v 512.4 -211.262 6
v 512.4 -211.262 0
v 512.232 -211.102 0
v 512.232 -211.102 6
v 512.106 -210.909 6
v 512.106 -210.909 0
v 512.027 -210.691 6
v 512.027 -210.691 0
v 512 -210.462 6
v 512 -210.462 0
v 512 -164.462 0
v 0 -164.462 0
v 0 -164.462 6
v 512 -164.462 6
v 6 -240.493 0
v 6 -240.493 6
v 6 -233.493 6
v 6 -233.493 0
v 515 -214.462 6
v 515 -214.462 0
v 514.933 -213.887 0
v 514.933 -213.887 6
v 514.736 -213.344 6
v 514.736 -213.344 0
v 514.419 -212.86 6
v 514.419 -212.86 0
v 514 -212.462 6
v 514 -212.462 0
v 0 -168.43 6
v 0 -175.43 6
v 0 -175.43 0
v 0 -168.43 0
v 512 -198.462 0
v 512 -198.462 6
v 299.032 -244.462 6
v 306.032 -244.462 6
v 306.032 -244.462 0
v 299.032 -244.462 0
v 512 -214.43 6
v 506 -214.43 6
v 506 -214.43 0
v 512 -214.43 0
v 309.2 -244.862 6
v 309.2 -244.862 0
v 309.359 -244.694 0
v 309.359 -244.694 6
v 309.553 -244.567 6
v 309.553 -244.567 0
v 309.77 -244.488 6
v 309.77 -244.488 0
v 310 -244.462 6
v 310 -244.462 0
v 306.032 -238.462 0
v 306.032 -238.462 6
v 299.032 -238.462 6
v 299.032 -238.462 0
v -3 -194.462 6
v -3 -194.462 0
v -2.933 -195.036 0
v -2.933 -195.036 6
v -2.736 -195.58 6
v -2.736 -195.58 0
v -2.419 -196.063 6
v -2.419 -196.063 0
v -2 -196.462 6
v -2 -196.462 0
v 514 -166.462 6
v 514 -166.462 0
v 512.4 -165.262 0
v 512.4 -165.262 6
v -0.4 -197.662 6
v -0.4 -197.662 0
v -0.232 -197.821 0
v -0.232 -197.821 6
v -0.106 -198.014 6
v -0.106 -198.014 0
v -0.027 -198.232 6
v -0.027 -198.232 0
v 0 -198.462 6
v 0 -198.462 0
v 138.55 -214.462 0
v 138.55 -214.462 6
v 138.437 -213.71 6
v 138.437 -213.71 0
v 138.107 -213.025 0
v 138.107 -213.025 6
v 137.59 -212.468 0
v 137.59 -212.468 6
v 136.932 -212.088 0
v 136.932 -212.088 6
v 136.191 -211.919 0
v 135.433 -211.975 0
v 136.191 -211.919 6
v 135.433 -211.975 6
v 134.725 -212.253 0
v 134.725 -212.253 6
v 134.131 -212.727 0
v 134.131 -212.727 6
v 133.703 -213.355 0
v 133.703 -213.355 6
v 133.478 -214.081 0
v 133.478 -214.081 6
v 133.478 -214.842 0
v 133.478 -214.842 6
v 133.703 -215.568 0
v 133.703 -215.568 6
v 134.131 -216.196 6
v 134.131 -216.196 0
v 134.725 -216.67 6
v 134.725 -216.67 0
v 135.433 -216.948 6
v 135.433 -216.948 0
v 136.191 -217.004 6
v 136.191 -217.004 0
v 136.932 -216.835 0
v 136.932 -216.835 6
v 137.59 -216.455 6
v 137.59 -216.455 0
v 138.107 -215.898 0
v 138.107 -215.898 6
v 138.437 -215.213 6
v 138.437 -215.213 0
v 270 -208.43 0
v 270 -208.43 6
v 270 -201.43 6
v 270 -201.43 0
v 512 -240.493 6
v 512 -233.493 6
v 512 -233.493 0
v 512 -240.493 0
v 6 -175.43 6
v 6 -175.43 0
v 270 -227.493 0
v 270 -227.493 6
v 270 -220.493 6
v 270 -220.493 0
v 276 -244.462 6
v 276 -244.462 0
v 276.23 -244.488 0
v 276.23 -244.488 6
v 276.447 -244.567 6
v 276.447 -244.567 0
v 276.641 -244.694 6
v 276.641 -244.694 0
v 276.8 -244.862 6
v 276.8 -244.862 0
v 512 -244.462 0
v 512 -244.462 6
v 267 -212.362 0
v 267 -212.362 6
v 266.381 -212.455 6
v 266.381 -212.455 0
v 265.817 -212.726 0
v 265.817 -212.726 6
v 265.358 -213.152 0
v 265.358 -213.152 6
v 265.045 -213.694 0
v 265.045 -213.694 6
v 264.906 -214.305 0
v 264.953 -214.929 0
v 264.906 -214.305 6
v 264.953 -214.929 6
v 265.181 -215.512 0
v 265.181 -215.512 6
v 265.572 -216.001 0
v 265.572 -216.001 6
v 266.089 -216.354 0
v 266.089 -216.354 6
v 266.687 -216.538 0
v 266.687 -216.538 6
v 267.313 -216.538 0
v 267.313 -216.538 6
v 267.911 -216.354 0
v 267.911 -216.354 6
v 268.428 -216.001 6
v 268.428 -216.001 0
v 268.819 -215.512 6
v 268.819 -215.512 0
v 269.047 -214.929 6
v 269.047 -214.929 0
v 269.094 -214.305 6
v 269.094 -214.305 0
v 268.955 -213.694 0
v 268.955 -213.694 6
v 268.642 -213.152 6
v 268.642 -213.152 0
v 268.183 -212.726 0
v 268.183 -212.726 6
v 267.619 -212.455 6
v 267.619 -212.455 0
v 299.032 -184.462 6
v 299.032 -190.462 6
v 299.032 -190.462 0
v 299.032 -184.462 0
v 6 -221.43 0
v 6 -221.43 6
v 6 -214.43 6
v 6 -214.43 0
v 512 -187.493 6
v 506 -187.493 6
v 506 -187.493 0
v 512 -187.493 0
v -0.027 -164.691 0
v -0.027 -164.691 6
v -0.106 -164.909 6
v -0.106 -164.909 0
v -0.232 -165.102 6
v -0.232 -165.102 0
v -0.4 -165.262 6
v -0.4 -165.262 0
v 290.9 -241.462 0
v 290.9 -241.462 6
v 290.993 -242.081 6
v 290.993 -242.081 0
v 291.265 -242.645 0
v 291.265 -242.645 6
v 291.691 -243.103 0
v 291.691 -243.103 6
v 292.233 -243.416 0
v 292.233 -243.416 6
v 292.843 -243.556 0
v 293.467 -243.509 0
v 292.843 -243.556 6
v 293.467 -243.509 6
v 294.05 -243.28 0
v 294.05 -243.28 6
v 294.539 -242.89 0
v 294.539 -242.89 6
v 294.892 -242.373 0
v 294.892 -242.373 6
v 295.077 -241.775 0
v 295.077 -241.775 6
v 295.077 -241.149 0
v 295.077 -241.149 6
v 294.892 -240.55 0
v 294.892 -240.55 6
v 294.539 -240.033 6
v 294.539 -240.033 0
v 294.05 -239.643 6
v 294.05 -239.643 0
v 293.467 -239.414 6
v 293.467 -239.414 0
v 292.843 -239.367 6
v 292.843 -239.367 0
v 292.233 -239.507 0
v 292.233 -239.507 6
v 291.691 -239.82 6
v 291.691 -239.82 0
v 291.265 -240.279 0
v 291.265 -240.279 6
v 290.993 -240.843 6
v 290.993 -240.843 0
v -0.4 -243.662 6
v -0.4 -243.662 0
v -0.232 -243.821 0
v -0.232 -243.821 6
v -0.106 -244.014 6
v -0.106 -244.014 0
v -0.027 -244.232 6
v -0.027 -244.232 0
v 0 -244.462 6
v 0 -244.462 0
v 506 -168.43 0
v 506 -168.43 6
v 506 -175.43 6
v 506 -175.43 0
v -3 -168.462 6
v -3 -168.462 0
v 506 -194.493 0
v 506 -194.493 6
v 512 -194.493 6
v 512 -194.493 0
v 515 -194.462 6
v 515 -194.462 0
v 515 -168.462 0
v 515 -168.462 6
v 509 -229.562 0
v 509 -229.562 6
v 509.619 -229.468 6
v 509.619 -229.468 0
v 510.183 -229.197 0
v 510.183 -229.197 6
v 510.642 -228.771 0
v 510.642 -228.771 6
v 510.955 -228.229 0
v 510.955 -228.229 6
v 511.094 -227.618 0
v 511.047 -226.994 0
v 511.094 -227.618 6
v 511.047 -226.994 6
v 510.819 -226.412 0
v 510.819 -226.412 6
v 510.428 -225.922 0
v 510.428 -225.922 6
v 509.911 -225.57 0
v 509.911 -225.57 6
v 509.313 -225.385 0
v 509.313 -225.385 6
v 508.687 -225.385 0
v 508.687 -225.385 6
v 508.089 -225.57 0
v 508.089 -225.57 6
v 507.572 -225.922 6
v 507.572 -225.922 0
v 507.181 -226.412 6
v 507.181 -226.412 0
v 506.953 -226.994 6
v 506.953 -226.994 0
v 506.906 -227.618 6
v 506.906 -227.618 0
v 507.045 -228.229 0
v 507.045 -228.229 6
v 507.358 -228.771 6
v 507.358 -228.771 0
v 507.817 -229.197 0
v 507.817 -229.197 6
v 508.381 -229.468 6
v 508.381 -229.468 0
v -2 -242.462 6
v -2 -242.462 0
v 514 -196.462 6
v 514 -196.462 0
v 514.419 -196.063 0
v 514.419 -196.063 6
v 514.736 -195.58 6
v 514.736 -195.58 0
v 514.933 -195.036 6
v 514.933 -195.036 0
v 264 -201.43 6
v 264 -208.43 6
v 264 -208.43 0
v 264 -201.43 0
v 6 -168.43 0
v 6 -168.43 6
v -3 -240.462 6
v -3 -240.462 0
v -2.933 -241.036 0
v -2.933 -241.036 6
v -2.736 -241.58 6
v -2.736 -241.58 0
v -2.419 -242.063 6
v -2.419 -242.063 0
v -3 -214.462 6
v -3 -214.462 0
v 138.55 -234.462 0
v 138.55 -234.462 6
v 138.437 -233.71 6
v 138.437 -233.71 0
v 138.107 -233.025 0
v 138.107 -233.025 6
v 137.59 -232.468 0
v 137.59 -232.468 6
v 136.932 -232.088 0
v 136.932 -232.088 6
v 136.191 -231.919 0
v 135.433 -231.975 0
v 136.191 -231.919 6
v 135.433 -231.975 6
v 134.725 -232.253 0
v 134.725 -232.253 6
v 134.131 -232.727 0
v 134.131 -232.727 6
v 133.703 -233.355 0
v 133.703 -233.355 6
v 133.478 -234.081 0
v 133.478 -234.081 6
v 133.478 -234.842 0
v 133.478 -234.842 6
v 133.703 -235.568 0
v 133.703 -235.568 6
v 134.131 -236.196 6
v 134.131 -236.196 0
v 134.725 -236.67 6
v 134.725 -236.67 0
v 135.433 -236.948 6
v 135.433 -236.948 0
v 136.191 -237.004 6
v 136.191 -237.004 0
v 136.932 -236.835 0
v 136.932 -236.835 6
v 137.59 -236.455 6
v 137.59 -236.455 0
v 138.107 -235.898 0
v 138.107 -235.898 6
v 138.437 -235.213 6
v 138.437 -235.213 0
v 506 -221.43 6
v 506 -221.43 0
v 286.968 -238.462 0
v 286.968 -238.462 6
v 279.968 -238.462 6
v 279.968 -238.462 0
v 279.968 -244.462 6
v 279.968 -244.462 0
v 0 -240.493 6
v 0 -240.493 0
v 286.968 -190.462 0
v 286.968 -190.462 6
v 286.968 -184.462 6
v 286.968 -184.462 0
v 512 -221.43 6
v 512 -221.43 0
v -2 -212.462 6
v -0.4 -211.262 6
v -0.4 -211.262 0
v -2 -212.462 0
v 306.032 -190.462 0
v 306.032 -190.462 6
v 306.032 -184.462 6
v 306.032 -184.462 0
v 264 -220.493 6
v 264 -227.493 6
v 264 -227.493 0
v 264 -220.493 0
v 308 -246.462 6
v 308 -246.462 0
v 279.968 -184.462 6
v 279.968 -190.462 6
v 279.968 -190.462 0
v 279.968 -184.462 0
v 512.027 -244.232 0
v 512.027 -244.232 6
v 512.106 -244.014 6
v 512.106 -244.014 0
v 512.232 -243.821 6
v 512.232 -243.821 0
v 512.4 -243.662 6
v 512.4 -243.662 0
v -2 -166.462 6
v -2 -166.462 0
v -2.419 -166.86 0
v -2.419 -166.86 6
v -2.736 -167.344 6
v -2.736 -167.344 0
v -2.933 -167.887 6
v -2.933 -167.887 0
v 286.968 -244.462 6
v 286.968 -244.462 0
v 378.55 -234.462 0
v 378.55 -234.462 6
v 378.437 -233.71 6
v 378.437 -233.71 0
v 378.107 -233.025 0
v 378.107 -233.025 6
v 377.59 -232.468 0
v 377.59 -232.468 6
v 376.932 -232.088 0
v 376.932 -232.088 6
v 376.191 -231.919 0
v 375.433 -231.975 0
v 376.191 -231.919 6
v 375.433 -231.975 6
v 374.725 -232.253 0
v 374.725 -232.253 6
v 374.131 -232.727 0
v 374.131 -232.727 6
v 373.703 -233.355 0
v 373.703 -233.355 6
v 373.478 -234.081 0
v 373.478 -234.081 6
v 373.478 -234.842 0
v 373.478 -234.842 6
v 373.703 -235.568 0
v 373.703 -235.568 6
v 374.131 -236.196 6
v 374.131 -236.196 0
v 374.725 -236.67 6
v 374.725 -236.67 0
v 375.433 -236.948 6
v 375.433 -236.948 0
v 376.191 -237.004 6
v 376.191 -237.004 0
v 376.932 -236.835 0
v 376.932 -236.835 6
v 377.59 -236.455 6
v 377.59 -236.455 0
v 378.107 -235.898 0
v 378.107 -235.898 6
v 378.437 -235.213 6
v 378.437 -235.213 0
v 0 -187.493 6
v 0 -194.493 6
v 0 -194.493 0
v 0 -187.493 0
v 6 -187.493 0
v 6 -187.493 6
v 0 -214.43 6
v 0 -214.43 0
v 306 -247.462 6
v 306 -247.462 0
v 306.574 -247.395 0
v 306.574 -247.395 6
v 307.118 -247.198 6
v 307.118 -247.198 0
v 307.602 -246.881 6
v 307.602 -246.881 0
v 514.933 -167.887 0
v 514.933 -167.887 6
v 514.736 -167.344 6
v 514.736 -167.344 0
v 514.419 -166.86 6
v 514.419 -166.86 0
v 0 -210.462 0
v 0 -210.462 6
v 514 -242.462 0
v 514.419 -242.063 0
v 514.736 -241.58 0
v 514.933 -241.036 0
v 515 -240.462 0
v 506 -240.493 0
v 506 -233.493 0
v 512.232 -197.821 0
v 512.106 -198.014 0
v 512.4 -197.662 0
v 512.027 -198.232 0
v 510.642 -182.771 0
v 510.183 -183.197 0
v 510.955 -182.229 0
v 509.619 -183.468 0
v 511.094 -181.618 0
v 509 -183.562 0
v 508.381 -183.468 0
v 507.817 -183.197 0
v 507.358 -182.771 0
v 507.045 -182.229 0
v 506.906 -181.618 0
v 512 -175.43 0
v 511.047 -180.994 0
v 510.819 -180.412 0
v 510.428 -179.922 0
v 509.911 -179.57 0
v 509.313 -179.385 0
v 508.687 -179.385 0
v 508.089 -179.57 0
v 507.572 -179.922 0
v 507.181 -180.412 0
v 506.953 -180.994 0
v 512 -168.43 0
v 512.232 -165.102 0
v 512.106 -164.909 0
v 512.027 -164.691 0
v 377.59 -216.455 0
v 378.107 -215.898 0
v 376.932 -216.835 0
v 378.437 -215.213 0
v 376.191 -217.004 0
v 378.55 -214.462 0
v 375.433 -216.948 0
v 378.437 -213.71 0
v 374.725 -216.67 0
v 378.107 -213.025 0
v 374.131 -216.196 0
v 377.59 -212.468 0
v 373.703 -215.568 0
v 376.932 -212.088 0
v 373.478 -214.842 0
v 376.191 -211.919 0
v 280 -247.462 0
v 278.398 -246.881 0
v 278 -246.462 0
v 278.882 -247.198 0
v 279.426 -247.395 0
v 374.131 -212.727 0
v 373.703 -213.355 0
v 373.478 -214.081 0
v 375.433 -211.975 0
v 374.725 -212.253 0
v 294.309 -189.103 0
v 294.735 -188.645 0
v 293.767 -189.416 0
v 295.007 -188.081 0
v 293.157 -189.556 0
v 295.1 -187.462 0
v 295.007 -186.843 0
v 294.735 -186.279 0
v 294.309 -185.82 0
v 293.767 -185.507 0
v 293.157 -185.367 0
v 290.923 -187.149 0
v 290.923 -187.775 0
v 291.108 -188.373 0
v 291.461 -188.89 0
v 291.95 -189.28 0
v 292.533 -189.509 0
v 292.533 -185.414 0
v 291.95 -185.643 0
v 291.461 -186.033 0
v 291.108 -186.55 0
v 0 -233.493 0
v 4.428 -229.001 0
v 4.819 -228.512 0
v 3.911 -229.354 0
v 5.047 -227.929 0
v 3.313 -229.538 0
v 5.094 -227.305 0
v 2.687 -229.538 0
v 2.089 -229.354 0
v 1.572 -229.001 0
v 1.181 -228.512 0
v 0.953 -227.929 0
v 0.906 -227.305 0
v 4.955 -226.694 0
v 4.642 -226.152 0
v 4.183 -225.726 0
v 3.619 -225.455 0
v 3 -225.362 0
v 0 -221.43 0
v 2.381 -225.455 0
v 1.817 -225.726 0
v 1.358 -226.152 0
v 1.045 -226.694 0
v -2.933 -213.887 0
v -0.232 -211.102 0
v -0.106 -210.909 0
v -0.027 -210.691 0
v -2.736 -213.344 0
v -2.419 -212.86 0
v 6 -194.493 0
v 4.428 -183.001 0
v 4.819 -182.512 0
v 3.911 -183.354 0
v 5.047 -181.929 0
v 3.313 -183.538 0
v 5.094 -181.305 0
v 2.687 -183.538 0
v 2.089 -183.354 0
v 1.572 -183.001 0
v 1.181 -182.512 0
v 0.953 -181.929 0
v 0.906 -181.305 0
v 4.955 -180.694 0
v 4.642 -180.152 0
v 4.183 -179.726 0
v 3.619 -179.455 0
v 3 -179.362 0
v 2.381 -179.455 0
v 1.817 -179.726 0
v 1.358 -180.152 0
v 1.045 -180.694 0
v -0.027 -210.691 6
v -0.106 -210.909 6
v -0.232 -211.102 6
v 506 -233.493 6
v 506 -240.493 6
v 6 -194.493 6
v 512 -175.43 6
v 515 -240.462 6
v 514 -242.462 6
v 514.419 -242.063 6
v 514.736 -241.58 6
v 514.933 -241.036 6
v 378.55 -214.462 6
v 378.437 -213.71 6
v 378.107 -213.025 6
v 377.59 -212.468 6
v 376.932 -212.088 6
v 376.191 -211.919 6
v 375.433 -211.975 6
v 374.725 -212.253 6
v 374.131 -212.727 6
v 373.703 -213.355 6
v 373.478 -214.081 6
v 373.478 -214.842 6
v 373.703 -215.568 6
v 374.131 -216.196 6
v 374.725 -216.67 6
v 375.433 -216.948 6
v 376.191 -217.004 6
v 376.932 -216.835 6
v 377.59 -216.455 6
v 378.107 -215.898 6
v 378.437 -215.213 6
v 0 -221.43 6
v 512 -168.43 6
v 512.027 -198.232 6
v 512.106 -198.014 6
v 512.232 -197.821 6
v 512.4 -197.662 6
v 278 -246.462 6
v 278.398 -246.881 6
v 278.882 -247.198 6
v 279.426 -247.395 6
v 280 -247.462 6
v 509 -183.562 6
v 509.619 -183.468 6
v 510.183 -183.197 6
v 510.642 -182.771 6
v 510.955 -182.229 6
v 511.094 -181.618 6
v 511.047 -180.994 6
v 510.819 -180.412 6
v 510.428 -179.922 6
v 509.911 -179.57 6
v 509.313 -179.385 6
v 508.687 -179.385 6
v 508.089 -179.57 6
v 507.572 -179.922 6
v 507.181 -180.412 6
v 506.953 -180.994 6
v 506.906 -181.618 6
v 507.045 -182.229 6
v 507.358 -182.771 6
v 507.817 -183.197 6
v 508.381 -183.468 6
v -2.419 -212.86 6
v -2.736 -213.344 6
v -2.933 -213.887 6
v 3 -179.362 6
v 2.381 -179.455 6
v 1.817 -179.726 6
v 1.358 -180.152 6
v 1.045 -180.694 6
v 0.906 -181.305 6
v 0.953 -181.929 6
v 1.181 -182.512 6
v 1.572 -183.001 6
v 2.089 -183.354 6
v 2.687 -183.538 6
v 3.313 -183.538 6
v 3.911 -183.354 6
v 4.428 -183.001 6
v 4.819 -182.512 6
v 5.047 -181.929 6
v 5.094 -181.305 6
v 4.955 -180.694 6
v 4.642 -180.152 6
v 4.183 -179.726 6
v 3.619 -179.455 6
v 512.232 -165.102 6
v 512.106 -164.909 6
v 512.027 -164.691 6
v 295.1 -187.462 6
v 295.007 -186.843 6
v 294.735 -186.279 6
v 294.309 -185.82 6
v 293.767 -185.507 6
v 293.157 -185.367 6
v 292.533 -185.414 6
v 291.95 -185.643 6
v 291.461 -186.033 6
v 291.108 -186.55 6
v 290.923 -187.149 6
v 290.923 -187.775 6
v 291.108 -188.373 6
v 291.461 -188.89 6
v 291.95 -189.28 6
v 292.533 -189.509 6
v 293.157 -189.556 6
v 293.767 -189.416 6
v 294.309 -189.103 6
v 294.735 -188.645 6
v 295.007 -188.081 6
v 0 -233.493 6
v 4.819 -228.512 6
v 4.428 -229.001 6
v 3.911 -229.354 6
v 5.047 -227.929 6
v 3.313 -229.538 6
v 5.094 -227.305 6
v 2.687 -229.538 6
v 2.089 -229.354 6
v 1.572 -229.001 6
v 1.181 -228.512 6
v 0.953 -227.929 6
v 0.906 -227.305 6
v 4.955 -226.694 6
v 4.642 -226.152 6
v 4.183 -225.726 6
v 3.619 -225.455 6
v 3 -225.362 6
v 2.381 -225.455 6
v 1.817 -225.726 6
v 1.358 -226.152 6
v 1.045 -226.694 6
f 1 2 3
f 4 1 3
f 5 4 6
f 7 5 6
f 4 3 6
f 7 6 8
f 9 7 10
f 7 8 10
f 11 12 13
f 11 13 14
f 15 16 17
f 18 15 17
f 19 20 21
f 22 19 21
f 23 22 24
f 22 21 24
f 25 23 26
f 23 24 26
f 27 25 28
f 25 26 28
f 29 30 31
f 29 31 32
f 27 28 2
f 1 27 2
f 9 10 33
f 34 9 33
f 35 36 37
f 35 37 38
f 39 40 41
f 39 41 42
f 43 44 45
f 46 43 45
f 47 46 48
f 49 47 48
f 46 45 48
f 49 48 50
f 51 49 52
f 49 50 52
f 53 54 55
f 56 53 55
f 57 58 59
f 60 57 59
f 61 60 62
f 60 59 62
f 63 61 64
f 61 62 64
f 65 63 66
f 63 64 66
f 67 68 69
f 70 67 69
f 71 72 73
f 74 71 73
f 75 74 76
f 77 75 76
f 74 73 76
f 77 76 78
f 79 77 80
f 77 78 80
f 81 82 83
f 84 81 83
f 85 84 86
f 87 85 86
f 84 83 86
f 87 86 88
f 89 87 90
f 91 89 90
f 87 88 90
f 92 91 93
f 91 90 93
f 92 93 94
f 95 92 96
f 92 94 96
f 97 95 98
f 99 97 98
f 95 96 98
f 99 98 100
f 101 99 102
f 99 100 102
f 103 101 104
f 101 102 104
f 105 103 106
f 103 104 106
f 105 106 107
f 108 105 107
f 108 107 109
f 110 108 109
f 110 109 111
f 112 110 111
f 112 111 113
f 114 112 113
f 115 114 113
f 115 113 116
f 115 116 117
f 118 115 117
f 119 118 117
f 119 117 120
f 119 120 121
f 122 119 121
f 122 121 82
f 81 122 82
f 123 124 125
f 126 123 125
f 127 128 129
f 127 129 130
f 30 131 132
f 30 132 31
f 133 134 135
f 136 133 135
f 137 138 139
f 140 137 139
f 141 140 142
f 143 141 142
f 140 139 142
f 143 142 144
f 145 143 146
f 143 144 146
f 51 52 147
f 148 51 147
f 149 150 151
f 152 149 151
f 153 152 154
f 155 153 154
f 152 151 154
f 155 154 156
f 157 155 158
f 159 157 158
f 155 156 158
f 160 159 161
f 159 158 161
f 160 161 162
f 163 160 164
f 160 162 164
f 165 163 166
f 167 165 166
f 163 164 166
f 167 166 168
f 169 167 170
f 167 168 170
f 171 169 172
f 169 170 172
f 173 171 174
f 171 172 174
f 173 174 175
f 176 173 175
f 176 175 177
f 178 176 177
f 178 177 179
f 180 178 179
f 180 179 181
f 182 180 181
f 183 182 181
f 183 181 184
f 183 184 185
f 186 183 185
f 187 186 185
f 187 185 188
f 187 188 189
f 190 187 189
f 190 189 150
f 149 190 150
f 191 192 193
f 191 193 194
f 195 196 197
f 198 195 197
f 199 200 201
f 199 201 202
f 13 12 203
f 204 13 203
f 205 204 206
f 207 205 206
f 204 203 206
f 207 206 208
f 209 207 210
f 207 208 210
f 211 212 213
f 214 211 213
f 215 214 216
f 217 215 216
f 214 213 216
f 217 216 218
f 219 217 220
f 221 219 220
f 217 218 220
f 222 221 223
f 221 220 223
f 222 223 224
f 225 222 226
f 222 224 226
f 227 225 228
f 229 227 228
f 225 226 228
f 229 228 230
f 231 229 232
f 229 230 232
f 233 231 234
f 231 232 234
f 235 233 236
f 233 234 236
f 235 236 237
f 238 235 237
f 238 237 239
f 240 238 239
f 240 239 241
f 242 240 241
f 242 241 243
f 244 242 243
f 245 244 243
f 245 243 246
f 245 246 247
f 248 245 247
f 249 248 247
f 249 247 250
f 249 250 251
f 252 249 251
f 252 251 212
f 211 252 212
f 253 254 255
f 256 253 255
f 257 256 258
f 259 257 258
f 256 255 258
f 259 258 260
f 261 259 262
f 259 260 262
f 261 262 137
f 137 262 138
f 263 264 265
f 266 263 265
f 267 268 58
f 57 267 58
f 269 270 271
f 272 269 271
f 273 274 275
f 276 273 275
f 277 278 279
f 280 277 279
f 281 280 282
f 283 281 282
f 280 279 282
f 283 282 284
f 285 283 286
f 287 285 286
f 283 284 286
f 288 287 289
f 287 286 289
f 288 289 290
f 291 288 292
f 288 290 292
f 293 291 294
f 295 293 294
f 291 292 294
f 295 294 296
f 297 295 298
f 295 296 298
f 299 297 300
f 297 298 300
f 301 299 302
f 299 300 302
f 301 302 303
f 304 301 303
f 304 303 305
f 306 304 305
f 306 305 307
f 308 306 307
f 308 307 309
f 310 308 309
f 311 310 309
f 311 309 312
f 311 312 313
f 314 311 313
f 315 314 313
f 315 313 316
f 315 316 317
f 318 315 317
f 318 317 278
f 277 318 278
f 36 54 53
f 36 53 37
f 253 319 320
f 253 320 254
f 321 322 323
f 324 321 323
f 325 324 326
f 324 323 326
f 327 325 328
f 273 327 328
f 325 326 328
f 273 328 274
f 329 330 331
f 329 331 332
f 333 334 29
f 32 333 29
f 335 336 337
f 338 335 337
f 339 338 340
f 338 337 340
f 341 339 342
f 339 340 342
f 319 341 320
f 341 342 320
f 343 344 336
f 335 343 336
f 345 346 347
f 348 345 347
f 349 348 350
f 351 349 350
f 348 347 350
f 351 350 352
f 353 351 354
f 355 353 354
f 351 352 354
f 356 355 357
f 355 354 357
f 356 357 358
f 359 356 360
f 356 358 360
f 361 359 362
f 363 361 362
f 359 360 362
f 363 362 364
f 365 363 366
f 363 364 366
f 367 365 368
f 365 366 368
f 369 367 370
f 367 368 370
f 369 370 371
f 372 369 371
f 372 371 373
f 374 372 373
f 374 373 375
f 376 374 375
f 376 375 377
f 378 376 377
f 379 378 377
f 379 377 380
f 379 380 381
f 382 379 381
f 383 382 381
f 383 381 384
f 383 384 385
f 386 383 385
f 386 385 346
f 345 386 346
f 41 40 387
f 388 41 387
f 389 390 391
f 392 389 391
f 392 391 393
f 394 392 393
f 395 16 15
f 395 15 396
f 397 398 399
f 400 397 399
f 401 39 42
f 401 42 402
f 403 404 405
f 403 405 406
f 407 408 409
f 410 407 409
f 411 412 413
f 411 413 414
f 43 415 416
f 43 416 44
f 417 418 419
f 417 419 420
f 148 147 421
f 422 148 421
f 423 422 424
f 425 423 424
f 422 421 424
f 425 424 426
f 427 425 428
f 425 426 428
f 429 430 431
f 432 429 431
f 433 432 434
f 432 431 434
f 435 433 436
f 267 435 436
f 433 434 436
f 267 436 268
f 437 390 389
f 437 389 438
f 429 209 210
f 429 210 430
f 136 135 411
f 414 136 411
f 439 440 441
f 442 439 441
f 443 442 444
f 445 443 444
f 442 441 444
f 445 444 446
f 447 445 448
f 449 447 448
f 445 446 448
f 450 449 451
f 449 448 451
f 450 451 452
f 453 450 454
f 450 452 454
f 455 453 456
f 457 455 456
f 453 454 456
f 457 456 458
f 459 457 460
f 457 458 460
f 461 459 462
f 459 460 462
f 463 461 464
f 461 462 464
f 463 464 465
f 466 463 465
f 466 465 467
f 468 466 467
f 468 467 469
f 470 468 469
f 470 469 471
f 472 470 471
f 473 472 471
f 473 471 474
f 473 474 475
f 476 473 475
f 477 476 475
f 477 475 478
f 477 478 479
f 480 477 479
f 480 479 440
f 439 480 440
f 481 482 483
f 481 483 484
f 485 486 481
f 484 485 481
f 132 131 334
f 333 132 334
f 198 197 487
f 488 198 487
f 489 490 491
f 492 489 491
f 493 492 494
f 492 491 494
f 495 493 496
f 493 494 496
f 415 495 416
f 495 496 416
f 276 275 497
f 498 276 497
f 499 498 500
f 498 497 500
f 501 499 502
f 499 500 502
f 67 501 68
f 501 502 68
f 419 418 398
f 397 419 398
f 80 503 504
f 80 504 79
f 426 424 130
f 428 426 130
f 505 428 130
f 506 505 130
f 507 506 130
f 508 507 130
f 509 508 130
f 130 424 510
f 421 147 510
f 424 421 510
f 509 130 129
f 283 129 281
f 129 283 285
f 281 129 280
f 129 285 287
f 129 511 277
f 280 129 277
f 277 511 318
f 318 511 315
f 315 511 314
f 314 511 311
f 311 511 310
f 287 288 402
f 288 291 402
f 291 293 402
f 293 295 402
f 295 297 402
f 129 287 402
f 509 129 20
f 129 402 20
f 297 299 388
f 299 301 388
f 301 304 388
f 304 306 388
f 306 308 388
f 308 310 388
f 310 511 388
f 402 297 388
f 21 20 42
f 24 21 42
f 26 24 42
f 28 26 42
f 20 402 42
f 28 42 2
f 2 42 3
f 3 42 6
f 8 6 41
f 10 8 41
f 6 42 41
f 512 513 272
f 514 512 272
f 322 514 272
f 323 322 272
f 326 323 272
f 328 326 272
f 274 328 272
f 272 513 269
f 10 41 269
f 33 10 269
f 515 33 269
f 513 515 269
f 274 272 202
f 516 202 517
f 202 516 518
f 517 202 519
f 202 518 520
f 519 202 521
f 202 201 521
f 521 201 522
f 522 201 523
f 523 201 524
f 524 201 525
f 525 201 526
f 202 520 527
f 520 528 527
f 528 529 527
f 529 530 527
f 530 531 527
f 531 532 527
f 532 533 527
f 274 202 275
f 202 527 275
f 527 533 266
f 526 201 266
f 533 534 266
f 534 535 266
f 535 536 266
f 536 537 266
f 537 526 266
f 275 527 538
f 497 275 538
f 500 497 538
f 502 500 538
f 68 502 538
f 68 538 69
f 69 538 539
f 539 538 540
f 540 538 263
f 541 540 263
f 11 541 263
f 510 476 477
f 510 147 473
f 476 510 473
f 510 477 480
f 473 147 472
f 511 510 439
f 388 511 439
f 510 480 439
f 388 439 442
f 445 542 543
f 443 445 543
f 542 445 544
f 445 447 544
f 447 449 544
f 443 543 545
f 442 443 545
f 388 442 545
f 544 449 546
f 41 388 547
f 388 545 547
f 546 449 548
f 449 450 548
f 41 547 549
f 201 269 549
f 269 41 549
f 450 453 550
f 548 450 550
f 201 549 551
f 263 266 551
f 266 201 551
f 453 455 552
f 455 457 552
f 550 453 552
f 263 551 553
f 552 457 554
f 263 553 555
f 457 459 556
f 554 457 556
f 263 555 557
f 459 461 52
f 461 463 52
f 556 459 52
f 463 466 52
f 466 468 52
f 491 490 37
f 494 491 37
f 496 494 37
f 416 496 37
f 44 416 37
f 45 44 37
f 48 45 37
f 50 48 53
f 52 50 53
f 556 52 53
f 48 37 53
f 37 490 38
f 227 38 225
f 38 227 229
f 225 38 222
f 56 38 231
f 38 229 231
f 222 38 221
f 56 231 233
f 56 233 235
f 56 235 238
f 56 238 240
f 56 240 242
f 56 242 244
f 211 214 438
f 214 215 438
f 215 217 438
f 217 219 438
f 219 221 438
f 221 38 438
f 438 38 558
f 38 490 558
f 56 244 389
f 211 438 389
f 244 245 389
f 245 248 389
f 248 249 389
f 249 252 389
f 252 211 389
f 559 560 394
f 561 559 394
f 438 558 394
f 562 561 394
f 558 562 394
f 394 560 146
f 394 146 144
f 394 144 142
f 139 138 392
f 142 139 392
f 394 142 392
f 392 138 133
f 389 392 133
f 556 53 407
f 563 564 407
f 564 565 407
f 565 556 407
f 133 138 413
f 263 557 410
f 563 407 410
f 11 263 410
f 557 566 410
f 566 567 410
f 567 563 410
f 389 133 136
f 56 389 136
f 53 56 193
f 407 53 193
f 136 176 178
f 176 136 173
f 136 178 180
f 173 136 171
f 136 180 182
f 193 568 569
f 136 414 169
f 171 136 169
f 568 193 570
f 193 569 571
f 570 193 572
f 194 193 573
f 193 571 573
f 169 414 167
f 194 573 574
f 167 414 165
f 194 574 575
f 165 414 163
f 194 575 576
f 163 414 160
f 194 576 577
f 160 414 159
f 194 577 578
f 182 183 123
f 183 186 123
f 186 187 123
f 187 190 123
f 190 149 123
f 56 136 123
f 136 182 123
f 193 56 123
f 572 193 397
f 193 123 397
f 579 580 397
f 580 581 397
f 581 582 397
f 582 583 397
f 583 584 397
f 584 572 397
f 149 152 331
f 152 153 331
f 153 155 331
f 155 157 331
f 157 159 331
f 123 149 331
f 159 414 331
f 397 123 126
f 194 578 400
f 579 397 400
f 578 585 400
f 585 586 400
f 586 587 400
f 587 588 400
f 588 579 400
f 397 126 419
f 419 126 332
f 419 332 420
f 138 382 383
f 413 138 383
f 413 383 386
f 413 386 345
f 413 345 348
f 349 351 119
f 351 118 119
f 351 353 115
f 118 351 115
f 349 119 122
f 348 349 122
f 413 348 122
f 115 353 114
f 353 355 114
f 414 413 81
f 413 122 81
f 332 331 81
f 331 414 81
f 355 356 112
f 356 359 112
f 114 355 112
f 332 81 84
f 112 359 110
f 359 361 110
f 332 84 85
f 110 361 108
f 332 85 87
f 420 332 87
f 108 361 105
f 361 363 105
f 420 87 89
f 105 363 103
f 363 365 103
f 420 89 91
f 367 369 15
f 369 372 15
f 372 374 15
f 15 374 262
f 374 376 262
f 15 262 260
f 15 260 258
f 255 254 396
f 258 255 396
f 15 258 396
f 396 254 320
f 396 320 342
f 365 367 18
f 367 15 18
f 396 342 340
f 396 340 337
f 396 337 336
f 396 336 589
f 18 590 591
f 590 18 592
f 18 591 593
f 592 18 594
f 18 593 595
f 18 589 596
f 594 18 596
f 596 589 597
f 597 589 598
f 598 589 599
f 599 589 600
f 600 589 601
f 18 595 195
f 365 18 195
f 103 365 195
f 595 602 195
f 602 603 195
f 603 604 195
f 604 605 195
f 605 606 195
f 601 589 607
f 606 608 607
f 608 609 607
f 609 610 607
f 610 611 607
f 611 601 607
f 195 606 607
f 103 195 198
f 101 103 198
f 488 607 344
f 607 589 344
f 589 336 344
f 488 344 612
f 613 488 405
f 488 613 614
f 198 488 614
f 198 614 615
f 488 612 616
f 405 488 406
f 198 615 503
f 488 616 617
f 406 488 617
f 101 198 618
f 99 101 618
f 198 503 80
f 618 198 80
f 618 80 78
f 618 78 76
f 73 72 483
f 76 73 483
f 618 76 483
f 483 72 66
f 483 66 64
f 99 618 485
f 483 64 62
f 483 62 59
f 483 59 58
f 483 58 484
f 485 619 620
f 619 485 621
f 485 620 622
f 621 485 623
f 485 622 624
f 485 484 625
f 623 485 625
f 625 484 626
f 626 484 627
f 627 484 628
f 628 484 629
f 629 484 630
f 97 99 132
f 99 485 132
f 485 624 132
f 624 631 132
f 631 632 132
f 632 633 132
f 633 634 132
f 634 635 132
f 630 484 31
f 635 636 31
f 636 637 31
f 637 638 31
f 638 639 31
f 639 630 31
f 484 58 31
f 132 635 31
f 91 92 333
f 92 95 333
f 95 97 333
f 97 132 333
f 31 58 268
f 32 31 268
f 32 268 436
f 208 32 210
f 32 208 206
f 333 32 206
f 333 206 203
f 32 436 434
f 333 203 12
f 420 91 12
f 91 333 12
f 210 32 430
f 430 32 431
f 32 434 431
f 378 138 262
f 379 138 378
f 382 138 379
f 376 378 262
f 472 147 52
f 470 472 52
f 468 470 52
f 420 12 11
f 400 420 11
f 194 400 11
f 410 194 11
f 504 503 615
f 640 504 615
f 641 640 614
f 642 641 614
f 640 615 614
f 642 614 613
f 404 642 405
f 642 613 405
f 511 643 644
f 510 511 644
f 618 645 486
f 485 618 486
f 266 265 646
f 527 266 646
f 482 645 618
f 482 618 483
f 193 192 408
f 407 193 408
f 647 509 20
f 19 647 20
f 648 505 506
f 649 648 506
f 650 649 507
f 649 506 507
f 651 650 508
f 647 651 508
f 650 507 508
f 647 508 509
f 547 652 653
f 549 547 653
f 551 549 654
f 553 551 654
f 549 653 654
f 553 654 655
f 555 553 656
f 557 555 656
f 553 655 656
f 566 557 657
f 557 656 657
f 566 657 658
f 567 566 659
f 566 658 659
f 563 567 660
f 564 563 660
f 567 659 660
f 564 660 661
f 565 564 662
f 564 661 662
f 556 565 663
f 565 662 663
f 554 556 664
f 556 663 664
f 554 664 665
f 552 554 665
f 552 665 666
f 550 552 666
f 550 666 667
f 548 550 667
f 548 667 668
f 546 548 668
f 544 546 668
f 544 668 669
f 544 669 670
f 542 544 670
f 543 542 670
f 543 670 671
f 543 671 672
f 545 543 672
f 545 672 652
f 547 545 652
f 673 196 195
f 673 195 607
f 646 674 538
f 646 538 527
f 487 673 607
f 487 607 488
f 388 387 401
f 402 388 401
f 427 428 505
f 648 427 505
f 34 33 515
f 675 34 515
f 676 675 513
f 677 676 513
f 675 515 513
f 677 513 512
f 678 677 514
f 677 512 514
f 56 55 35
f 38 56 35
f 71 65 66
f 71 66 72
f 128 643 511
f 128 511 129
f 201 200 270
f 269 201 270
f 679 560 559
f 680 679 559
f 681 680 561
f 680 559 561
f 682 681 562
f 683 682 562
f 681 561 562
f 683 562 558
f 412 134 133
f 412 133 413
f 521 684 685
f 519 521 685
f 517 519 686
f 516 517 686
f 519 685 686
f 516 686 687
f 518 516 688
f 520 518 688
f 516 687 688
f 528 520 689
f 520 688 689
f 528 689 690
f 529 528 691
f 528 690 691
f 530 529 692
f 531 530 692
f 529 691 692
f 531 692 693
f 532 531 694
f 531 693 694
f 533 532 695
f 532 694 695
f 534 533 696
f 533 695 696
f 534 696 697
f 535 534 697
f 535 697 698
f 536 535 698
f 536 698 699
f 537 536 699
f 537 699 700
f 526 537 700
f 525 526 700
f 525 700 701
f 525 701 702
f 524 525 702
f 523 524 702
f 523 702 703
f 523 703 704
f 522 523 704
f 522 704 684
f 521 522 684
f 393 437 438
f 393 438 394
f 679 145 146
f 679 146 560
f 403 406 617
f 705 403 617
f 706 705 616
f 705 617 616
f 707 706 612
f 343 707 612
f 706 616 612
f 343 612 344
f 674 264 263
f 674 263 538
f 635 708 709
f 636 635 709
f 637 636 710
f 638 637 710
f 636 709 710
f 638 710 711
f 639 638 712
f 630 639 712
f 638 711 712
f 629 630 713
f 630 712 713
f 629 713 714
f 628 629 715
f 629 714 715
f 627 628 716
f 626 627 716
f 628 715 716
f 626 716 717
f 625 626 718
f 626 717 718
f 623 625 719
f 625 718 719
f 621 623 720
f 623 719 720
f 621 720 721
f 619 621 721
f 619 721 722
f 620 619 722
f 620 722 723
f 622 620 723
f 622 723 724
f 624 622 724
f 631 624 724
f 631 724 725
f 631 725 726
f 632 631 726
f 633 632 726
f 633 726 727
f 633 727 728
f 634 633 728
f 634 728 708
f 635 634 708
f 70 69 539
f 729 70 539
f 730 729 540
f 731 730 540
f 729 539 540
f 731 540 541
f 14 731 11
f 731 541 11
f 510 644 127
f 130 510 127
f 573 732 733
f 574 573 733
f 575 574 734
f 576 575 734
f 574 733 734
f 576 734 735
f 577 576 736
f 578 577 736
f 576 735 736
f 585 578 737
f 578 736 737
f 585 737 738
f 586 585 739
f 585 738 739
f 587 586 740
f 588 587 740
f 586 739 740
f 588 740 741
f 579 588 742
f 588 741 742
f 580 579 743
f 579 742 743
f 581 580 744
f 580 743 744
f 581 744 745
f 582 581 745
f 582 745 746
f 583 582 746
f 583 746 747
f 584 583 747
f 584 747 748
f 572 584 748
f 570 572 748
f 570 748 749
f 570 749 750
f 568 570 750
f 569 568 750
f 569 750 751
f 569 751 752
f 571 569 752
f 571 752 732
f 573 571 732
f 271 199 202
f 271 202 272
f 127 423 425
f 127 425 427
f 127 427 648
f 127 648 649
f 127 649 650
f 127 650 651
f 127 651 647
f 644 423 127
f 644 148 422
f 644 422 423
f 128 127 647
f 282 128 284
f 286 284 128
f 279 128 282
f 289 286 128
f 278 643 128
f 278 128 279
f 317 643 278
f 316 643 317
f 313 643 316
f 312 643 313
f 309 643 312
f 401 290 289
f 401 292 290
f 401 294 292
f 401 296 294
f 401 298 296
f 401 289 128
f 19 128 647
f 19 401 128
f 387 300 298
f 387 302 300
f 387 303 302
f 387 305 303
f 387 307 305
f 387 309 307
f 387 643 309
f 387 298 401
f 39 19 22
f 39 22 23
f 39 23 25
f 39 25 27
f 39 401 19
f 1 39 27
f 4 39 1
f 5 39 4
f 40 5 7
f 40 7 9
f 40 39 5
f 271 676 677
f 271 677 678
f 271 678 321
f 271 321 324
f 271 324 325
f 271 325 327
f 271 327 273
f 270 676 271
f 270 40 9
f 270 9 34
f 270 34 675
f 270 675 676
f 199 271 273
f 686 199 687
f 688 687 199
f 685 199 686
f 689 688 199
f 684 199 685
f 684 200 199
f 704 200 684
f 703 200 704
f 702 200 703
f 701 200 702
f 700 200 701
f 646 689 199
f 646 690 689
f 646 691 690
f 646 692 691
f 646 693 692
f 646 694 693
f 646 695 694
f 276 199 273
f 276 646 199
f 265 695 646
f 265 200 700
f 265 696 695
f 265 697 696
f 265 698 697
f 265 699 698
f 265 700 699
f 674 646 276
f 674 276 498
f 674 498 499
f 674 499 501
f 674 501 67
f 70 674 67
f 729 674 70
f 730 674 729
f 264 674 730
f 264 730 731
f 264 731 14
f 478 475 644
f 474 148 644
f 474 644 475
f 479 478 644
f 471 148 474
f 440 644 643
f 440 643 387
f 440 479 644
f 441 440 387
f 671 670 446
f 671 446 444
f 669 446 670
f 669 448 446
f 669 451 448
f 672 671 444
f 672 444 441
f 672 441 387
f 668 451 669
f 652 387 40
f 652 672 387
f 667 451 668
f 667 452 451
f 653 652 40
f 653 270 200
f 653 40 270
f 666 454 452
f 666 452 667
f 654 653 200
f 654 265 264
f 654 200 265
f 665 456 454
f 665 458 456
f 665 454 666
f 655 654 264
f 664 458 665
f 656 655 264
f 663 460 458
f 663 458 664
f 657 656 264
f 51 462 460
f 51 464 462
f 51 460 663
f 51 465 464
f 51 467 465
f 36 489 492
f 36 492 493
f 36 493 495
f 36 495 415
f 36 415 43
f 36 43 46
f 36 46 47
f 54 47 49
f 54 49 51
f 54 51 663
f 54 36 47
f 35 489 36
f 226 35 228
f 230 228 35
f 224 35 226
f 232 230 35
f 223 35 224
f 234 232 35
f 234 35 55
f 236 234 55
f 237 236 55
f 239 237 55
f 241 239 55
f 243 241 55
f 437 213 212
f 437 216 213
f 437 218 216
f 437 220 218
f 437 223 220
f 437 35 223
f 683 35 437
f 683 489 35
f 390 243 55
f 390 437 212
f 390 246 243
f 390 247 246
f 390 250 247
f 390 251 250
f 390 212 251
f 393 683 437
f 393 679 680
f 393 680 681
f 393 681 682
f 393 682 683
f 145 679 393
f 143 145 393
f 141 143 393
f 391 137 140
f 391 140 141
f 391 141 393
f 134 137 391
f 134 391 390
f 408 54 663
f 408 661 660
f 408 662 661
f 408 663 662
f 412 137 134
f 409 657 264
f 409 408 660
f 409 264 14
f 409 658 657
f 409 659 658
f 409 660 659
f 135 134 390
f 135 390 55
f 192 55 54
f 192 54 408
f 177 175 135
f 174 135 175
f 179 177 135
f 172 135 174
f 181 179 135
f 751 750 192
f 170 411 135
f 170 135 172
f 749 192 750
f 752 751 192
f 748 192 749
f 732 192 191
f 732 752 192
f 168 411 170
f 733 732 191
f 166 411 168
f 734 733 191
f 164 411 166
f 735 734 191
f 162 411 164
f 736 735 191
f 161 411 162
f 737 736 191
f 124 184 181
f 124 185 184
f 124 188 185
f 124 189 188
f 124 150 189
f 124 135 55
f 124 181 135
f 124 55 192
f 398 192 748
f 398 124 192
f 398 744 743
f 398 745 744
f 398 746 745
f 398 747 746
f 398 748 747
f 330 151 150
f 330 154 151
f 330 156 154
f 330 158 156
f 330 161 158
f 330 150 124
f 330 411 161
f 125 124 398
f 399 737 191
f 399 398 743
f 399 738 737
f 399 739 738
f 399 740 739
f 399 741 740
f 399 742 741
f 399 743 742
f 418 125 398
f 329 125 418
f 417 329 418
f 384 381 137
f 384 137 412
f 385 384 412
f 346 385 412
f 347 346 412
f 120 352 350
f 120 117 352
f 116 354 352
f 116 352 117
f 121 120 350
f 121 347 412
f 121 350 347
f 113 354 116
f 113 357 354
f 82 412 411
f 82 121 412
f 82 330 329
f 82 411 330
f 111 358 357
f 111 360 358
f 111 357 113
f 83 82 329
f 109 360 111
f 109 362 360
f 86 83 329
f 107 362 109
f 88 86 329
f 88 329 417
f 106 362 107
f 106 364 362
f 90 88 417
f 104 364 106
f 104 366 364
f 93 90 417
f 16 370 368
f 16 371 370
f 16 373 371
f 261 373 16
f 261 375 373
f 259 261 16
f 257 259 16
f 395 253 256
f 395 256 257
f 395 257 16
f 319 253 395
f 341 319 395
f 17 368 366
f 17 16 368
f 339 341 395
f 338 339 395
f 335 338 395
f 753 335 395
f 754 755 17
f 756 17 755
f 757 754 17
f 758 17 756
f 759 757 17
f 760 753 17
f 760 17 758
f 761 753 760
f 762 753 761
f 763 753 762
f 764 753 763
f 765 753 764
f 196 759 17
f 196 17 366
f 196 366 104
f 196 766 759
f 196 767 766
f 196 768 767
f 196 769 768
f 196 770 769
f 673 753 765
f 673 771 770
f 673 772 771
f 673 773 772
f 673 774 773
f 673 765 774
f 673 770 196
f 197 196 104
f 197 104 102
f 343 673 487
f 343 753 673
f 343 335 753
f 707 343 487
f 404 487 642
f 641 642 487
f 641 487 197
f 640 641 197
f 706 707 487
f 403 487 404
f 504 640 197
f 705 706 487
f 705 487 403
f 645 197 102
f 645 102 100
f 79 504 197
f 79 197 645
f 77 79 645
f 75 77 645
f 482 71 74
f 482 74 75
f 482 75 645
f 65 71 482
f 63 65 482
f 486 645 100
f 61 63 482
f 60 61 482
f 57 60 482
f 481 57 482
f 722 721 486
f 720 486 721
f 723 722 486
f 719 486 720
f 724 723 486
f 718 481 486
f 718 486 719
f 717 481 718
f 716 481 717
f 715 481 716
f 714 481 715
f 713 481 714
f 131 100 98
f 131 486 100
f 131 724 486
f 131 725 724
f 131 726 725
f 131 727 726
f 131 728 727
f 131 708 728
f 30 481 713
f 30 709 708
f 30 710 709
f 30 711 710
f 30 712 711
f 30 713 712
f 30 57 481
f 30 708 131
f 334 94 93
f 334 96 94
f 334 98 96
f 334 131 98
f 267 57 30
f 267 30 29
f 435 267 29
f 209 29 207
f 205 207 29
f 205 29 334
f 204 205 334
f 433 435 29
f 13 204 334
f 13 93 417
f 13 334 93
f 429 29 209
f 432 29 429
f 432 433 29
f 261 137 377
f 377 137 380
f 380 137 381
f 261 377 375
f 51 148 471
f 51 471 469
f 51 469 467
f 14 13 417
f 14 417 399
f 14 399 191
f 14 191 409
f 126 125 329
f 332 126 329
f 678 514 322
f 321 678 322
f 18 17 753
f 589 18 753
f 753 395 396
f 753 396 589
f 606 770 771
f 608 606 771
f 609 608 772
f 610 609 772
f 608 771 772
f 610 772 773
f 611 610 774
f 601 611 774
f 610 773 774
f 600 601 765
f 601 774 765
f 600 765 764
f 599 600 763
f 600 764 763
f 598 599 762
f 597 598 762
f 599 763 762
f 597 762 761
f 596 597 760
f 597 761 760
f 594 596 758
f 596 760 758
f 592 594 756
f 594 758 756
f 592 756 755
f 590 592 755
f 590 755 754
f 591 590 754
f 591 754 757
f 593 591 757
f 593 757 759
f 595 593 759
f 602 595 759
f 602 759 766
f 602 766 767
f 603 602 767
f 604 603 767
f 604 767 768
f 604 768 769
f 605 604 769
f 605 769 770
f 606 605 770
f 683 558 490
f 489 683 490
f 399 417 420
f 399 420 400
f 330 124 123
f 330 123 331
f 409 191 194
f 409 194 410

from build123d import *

# Parameters (mm, degrees)
SKETCH_1_W           = 512
SKETCH_1_H           = 80
EXTRUDE_1_DEPTH      = 6
SKETCH_2_R           = 2.55
CUT_EXTRUDE_1_DEPTH  = 7
EXTRUDE_2_DEPTH      = 6
SKETCH_3_R           = 2.1
SKETCH_3_W           = 7
SKETCH_3_H           = 6
CUT_EXTRUDE_11_DEPTH = 7
EXTRUDE_21_DEPTH     = 6
SKETCH_31_R          = 2.1
SKETCH_31_W          = 7
SKETCH_31_H          = 6
CUT_EXTRUDE_12_DEPTH = 7
EXTRUDE_22_DEPTH     = 6
SKETCH_32_R          = 2.1
SKETCH_32_W          = 7
SKETCH_32_H          = 6
CUT_EXTRUDE_13_DEPTH = 7
EXTRUDE_23_DEPTH     = 6
SKETCH_33_R          = 2.1
SKETCH_33_W          = 7
SKETCH_33_H          = 6
CUT_EXTRUDE_14_DEPTH = 7
SKETCH_35_R          = 2.1
SKETCH_35_W          = 7
SKETCH_35_H          = 6
CUT_EXTRUDE_16_DEPTH = 7
EXTRUDE_25_DEPTH     = 6
SKETCH_36_R          = 2.1
SKETCH_36_W          = 7
SKETCH_36_H          = 6
CUT_EXTRUDE_17_DEPTH = 7
SKETCH_37_R          = 2.1
SKETCH_37_W          = 7
SKETCH_37_H          = 6
CUT_EXTRUDE_18_DEPTH = 7


with BuildPart() as part:
    # Эскиз1 → Бобышка-Вытянуть1 (new body)
    with BuildSketch(Plane.XY):
        with Locations((256, -204.461538462)):
            Rectangle(SKETCH_1_W, SKETCH_1_H)
    extrude(amount=EXTRUDE_1_DEPTH)

    # Эскиз2 → Вырез-Вытянуть1 (cut, through all)
    with BuildSketch(Plane.XY.offset(6)):
        with Locations((376, -234.461538462)):
            Circle(SKETCH_2_R)
        with Locations((376, -214.461538462)):
            Circle(SKETCH_2_R)
        with Locations((136, -234.461538462)):
            Circle(SKETCH_2_R)
        with Locations((136, -214.461538462)):
            Circle(SKETCH_2_R)
    extrude(amount=-CUT_EXTRUDE_1_DEPTH, mode=Mode.SUBTRACT)

    # Эскиз21 → Бобышка-Вытянуть2 (add)
    with BuildSketch(Plane(origin=(462, -227.461538462, 0), x_dir=(0, -1, 0), z_dir=(0, 0, 1))):
        with BuildLine():
            Line((13, 53), (-13, 53))
            ThreePointArc((-13, 53), (-14.118033989, 52.736067977), (-15, 52))
            Line((-15, 52), (-16.2, 50.4))
            ThreePointArc((-16.2, 50.4), (-16.552786405, 50.105572809), (-17, 50))
            Line((-17, 50), (17, 50))
            ThreePointArc((17, 50), (16.552786405, 50.105572809), (16.2, 50.4))
            Line((16.2, 50.4), (15, 52))
            ThreePointArc((15, 52), (14.118033989, 52.736067977), (13, 53))
        make_face()
    extrude(amount=EXTRUDE_2_DEPTH)

    # Эскиз3 → Вырез-Вытянуть11 (cut, through all)
    with BuildSketch(Plane(origin=(462, -227.461538462, 6), x_dir=(0, -1, 0), z_dir=(0, 0, 1))):
        with Locations((0, 47)):
            Circle(SKETCH_3_R)
        with Locations((9.531849908, 47)):
            Rectangle(SKETCH_3_W, SKETCH_3_H)
        with Locations((-9.531849908, 47)):
            Rectangle(SKETCH_3_W, SKETCH_3_H)
    extrude(amount=-CUT_EXTRUDE_11_DEPTH, mode=Mode.SUBTRACT)

    # Эскиз22 → Бобышка-Вытянуть21 (add)
    with BuildSketch(Plane(origin=(462, -181.461538462, 0), x_dir=(0, -1, 0), z_dir=(0, 0, 1))):
        with BuildLine():
            Line((13, 53), (-13, 53))
            ThreePointArc((-13, 53), (-14.118033989, 52.736067977), (-15, 52))
            Line((-15, 52), (-16.2, 50.4))
            ThreePointArc((-16.2, 50.4), (-16.552786405, 50.105572809), (-17, 50))
            Line((-17, 50), (17, 50))
            ThreePointArc((17, 50), (16.552786405, 50.105572809), (16.2, 50.4))
            Line((16.2, 50.4), (15, 52))
            ThreePointArc((15, 52), (14.118033989, 52.736067977), (13, 53))
        make_face()
    extrude(amount=EXTRUDE_21_DEPTH)

    # Эскиз31 → Вырез-Вытянуть12 (cut, through all)
    with BuildSketch(Plane(origin=(462, -181.461538462, 6), x_dir=(0, -1, 0), z_dir=(0, 0, 1))):
        with Locations((0, 47)):
            Circle(SKETCH_31_R)
        with Locations((9.531849908, 47)):
            Rectangle(SKETCH_31_W, SKETCH_31_H)
        with Locations((-9.531849908, 47)):
            Rectangle(SKETCH_31_W, SKETCH_31_H)
    extrude(amount=-CUT_EXTRUDE_12_DEPTH, mode=Mode.SUBTRACT)

    # Эскиз23 → Бобышка-Вытянуть22 (add)
    with BuildSketch(Plane(origin=(50, -227.461538462, 0), x_dir=(0, 1, 0), z_dir=(0, 0, 1))):
        with BuildLine():
            Line((13, 53), (-13, 53))
            ThreePointArc((-13, 53), (-14.118033989, 52.736067977), (-15, 52))
            Line((-15, 52), (-16.2, 50.4))
            ThreePointArc((-16.2, 50.4), (-16.552786405, 50.105572809), (-17, 50))
            Line((-17, 50), (17, 50))
            ThreePointArc((17, 50), (16.552786405, 50.105572809), (16.2, 50.4))
            Line((16.2, 50.4), (15, 52))
            ThreePointArc((15, 52), (14.118033989, 52.736067977), (13, 53))
        make_face()
    extrude(amount=EXTRUDE_22_DEPTH)

    # Эскиз32 → Вырез-Вытянуть13 (cut, through all)
    with BuildSketch(Plane(origin=(50, -227.461538462, 6), x_dir=(0, 1, 0), z_dir=(0, 0, 1))):
        with Locations((0, 47)):
            Circle(SKETCH_32_R)
        with Locations((9.531849908, 47)):
            Rectangle(SKETCH_32_W, SKETCH_32_H)
        with Locations((-9.531849908, 47)):
            Rectangle(SKETCH_32_W, SKETCH_32_H)
    extrude(amount=-CUT_EXTRUDE_13_DEPTH, mode=Mode.SUBTRACT)

    # Эскиз24 → Бобышка-Вытянуть23 (add)
    with BuildSketch(Plane(origin=(50, -181.461538462, 0), x_dir=(0, 1, 0), z_dir=(0, 0, 1))):
        with BuildLine():
            Line((13, 53), (-13, 53))
            ThreePointArc((-13, 53), (-14.118033989, 52.736067977), (-15, 52))
            Line((-15, 52), (-16.2, 50.4))
            ThreePointArc((-16.2, 50.4), (-16.552786405, 50.105572809), (-17, 50))
            Line((-17, 50), (17, 50))
            ThreePointArc((17, 50), (16.552786405, 50.105572809), (16.2, 50.4))
            Line((16.2, 50.4), (15, 52))
            ThreePointArc((15, 52), (14.118033989, 52.736067977), (13, 53))
        make_face()
    extrude(amount=EXTRUDE_23_DEPTH)

    # Эскиз33 → Вырез-Вытянуть14 (cut, through all)
    with BuildSketch(Plane(origin=(50, -181.461538462, 6), x_dir=(0, 1, 0), z_dir=(0, 0, 1))):
        with Locations((0, 47)):
            Circle(SKETCH_33_R)
        with Locations((9.531849908, 47)):
            Rectangle(SKETCH_33_W, SKETCH_33_H)
        with Locations((-9.531849908, 47)):
            Rectangle(SKETCH_33_W, SKETCH_33_H)
    extrude(amount=-CUT_EXTRUDE_14_DEPTH, mode=Mode.SUBTRACT)

    # Эскиз35 → Вырез-Вытянуть16 (cut, through all)
    with BuildSketch(Plane(origin=(314, -214.461538462, 6), x_dir=(0, 1, 0), z_dir=(0, 0, 1))):
        with Locations((0, 47)):
            Circle(SKETCH_35_R)
        with Locations((9.531849908, 47)):
            Rectangle(SKETCH_35_W, SKETCH_35_H)
        with Locations((-9.531849908, 47)):
            Rectangle(SKETCH_35_W, SKETCH_35_H)
    extrude(amount=-CUT_EXTRUDE_16_DEPTH, mode=Mode.SUBTRACT)

    # Эскиз25 → Бобышка-Вытянуть25 (add)
    with BuildSketch(Plane(origin=(293, -194.461538462, 0), x_dir=(-1, 0, 0), z_dir=(0, 0, 1))):
        with BuildLine():
            Line((13, 53), (-13, 53))
            ThreePointArc((-13, 53), (-14.118033989, 52.736067977), (-15, 52))
            Line((-15, 52), (-16.2, 50.4))
            ThreePointArc((-16.2, 50.4), (-16.552786405, 50.105572809), (-17, 50))
            Line((-17, 50), (17, 50))
            ThreePointArc((17, 50), (16.552786405, 50.105572809), (16.2, 50.4))
            Line((16.2, 50.4), (15, 52))
            ThreePointArc((15, 52), (14.118033989, 52.736067977), (13, 53))
        make_face()
    extrude(amount=EXTRUDE_25_DEPTH)

    # Эскиз36 → Вырез-Вытянуть17 (cut, through all)
    with BuildSketch(Plane(origin=(293, -194.461538462, 6), x_dir=(-1, 0, 0), z_dir=(0, 0, 1))):
        with Locations((0, 47)):
            Circle(SKETCH_36_R)
        with Locations((9.531849908, 47)):
            Rectangle(SKETCH_36_W, SKETCH_36_H)
        with Locations((-9.531849908, 47)):
            Rectangle(SKETCH_36_W, SKETCH_36_H)
    extrude(amount=-CUT_EXTRUDE_17_DEPTH, mode=Mode.SUBTRACT)

    # Эскиз37 → Вырез-Вытянуть18 (cut, through all)
    with BuildSketch(Plane(origin=(293, -234.461538462, 6), x_dir=(1, 0, 0), z_dir=(0, 0, 1))):
        with Locations((0, 47)):
            Circle(SKETCH_37_R)
        with Locations((9.531849908, 47)):
            Rectangle(SKETCH_37_W, SKETCH_37_H)
        with Locations((-9.531849908, 47)):
            Rectangle(SKETCH_37_W, SKETCH_37_H)
    extrude(amount=-CUT_EXTRUDE_18_DEPTH, mode=Mode.SUBTRACT)


solid = part.part
